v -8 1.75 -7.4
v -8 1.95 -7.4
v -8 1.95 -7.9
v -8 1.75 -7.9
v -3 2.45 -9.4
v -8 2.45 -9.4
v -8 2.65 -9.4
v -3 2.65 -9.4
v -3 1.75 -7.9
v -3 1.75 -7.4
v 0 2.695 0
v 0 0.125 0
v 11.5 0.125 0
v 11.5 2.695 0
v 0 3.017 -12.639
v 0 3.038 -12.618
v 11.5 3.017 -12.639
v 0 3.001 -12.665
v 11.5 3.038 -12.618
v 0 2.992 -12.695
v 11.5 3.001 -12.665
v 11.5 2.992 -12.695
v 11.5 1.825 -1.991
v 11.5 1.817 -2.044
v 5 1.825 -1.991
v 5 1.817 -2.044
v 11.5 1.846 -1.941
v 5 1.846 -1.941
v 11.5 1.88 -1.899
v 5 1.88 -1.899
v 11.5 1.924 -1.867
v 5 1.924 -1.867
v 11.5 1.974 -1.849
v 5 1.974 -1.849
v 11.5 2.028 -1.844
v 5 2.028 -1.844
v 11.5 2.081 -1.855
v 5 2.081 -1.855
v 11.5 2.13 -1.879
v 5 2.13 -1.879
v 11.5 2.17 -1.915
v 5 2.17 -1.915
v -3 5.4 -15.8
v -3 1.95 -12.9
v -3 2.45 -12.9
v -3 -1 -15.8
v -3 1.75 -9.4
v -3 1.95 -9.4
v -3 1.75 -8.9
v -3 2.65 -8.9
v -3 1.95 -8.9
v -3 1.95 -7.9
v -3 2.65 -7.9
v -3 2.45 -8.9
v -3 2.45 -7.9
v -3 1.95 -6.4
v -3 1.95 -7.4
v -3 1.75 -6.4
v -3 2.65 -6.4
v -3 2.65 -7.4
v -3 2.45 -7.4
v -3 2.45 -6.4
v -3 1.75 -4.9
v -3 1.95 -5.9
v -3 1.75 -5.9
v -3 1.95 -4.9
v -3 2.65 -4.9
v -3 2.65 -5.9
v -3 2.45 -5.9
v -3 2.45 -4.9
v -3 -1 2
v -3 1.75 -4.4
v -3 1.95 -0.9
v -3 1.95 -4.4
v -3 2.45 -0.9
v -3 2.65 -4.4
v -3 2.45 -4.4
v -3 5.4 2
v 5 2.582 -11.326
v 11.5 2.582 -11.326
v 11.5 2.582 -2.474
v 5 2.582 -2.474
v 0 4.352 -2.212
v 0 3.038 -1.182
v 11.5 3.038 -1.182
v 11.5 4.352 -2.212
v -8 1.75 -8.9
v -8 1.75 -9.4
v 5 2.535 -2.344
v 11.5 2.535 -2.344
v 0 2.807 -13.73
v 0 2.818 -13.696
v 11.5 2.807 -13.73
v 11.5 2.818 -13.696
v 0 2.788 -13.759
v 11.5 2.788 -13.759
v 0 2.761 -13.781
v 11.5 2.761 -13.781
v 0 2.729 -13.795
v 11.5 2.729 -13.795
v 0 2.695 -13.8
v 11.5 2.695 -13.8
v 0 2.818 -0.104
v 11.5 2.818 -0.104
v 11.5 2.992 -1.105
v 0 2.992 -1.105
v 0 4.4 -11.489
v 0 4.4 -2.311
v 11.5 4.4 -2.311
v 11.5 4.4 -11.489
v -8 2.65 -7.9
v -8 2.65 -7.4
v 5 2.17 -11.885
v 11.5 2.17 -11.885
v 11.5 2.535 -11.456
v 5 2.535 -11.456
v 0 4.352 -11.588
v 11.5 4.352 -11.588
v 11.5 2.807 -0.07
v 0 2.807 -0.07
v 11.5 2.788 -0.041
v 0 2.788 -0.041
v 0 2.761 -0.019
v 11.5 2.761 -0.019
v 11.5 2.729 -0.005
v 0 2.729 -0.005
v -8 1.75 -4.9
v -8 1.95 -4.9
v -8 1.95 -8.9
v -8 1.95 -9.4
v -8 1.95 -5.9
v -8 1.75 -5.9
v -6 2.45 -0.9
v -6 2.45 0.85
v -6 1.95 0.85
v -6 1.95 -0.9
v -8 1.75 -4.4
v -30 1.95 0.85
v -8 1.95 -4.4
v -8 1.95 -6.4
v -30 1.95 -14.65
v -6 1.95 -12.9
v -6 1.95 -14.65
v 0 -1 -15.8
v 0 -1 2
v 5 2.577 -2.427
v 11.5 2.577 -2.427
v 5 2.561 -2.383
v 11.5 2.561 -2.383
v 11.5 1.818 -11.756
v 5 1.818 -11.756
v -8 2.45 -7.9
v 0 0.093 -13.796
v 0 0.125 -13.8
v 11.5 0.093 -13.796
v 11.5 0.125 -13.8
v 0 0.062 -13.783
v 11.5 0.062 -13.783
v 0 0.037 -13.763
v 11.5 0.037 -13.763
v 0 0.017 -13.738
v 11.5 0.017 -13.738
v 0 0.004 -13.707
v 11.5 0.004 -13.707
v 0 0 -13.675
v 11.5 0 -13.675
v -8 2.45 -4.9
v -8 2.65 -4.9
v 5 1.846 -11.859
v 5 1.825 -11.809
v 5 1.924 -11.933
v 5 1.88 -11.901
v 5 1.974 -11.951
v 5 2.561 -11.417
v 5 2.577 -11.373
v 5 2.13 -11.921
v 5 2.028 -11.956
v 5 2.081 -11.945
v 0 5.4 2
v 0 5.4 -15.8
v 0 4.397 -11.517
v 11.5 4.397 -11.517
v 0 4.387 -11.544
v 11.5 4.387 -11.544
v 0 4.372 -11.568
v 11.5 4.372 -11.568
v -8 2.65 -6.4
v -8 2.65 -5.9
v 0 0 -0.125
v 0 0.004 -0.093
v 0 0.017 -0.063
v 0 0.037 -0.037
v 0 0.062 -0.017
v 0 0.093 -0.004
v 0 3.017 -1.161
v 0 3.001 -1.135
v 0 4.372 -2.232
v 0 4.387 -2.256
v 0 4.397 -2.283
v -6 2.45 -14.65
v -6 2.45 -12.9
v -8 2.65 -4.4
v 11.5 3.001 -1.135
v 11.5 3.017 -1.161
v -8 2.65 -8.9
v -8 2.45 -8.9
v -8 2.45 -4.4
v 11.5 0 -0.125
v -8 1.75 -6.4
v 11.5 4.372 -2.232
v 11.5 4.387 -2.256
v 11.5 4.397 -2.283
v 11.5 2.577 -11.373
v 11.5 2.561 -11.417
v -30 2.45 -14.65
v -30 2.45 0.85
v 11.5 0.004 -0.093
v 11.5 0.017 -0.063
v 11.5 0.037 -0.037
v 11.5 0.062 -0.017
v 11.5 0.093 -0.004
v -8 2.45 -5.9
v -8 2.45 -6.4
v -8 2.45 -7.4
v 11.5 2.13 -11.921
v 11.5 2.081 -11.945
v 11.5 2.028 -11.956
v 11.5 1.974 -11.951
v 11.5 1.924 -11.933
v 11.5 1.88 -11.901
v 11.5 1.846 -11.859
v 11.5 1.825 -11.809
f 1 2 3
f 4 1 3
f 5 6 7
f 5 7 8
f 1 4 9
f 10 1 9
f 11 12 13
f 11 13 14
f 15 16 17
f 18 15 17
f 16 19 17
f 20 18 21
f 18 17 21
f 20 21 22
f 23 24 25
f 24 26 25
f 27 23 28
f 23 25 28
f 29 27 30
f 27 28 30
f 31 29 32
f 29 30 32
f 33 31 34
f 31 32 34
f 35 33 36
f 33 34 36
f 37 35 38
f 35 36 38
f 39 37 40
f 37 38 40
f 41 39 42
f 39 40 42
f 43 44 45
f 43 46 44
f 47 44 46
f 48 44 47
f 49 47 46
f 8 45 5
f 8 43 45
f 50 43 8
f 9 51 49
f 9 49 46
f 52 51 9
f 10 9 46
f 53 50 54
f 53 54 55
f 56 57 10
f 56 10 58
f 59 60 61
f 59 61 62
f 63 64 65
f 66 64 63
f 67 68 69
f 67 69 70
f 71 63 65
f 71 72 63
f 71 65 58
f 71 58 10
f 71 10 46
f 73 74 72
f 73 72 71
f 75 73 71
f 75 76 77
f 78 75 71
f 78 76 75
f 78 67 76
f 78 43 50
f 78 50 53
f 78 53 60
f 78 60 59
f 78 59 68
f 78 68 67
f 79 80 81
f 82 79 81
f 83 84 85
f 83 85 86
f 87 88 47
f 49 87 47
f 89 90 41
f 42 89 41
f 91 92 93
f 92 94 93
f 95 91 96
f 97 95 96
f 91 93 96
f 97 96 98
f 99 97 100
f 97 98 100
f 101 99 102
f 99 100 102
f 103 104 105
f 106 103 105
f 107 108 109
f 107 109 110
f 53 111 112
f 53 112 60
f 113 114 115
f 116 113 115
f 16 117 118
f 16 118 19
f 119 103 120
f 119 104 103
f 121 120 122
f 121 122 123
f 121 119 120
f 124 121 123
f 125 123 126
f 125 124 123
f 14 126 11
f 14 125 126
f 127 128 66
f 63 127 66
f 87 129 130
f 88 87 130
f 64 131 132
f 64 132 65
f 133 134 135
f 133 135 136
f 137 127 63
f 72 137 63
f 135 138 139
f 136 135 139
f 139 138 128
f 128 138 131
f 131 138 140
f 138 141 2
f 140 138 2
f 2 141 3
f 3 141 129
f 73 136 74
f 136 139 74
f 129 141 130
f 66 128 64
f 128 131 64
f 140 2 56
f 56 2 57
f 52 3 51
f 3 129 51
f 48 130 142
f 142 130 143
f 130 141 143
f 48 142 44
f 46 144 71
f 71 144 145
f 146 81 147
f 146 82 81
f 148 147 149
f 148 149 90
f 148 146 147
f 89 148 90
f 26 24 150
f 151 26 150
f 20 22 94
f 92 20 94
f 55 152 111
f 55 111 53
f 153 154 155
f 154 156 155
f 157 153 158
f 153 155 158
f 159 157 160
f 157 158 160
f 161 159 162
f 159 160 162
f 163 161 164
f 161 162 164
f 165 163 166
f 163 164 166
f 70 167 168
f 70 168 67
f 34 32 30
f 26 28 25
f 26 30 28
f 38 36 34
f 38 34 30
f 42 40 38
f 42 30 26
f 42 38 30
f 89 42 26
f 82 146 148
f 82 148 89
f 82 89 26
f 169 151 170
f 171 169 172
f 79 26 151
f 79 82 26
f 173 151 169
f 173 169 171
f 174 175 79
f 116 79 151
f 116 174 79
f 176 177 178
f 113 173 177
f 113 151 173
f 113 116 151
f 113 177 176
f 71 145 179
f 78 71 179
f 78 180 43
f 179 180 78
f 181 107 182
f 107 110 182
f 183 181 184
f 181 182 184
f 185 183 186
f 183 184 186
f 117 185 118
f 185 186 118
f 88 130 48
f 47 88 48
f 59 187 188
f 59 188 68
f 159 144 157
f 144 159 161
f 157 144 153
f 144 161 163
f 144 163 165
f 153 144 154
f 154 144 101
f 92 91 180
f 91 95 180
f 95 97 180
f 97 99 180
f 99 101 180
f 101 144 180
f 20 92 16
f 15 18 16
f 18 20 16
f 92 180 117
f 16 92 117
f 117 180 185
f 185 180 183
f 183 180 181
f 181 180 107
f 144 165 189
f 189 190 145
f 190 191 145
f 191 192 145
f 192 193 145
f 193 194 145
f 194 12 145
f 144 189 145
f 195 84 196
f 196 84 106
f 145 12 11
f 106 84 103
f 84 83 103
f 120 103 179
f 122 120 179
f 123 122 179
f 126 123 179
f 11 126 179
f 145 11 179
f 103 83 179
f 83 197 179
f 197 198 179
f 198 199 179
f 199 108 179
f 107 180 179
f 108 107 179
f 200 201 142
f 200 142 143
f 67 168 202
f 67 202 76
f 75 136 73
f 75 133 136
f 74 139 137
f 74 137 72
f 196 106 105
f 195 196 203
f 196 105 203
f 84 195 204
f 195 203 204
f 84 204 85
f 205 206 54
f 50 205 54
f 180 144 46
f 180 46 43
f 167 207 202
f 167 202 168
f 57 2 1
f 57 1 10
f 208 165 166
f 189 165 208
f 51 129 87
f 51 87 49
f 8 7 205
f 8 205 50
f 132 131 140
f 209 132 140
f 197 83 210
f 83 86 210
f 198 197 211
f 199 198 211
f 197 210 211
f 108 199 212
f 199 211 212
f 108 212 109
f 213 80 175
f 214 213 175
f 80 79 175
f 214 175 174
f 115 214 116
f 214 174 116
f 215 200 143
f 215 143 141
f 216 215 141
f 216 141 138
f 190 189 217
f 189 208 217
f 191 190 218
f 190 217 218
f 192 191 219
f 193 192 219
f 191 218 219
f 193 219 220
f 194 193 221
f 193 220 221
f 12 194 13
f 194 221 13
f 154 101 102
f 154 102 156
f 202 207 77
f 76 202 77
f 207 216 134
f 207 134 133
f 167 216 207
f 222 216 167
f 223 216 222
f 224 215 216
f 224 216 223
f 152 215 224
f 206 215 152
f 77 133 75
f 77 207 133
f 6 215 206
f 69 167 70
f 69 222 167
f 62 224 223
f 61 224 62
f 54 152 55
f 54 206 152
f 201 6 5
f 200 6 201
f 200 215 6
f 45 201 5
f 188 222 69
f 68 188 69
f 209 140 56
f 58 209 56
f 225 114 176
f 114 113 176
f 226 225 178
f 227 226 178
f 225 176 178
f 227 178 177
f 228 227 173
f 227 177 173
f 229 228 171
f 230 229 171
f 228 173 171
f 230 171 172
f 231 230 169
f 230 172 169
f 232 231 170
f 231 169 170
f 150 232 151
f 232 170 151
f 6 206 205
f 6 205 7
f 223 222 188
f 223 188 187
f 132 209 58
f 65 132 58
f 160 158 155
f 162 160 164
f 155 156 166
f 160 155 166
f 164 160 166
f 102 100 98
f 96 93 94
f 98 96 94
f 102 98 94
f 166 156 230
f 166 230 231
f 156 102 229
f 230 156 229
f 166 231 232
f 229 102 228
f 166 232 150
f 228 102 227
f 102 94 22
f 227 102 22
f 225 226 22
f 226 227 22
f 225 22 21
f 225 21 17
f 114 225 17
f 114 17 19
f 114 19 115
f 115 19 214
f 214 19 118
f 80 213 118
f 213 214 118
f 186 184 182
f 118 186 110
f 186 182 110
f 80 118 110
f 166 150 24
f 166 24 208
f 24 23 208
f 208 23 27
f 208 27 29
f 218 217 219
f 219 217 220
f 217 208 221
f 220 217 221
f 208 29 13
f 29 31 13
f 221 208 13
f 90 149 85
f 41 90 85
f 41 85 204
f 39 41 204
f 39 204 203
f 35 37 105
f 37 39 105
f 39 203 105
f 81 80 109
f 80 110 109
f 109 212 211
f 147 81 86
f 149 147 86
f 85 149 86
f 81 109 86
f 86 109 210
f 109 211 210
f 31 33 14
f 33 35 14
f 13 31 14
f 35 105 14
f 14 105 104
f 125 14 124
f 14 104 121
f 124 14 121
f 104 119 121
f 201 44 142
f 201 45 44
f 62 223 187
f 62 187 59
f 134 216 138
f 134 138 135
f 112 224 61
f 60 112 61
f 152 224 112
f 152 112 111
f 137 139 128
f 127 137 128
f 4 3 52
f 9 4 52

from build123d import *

# Parameters (mm, degrees)
BOSS_EXTRUDE1_DEPTH = 11.5
SKETCH2_W           = 17.8
SKETCH2_H           = 6.4
BOSS_EXTRUDE2_DEPTH = 3
BOSS_EXTRUDE3_DEPTH = 0.25
SKETCH4_W           = 5
SKETCH4_H           = 0.5
BOSS_EXTRUDE4_DEPTH = 0.2
FILLET1_R           = 0.125
CUT_EXTRUDE1_DEPTH  = 6.5
FILLET2_R           = 0.2


with BuildPart() as part:
    # Sketch1 → Boss-Extrude1 (new body)
    with BuildSketch(Plane(origin=(0, 0, 0), x_dir=(0, 0, -1), z_dir=(1, 0, 0))):
        Polygon((0, 2.8), (1.152683079, 3.000553531), (2.25, 4.4), (11.55, 4.4), (12.647316921, 3.000553531), (13.8, 2.8), (13.8, 0), (0, 0), align=None)
    extrude(amount=BOSS_EXTRUDE1_DEPTH)

    # Sketch2 → Boss-Extrude2 (add)
    with BuildSketch(Plane.ZY):
        with Locations((-6.9, 2.2)):
            Rectangle(SKETCH2_W, SKETCH2_H)
    extrude(amount=BOSS_EXTRUDE2_DEPTH)

    # Sketch3 → Boss-Extrude3 (add, symmetric)
    with BuildSketch(Plane(origin=(0, 2.2, 0), x_dir=(1, 0, 0), z_dir=(0, 1, 0))):
        Polygon((-3, 12.9), (-6, 12.9), (-6, 14.65), (-30, 14.65), (-30, -0.85), (-6, -0.85), (-6, 0.9), (-3, 0.9), align=None)
    extrude(amount=BOSS_EXTRUDE3_DEPTH, both=True)

    # Sketch4 → Boss-Extrude4 (add)
    with BuildSketch(Plane(origin=(0, 2.45, 0), x_dir=(1, 0, 0), z_dir=(0, 1, 0))):
        with Locations((-5.5, 9.15)):
            Rectangle(SKETCH4_W, SKETCH4_H)
        with Locations((-5.5, 7.65)):
            Rectangle(SKETCH4_W, SKETCH4_H)
        with Locations((-5.5, 6.15)):
            Rectangle(SKETCH4_W, SKETCH4_H)
        with Locations((-5.5, 4.65)):
            Rectangle(SKETCH4_W, SKETCH4_H)
    boss_extrude4 = extrude(amount=BOSS_EXTRUDE4_DEPTH)

    # Mirror1: Boss-Extrude4 across plane
    add(boss_extrude4.mirror(Plane.ZX.offset(2.2)))

    # Fillet1
    fillet1_edges = [part.edges().sort_by_distance(p)[0] for p in [
        (5.75, 2.8, 0),
        (5.75, 3.000553531, -1.152683079),
        (5.75, 4.4, -2.25),
        (5.75, 4.4, -11.55),
        (5.75, 3.000553531, -12.647316921),
        (5.75, 2.8, -13.8),
        (5.75, 0, -13.8),
        (5.75, 0, 0),
    ]]
    fillet(fillet1_edges, radius=FILLET1_R)

    # Sketch5 → Cut-Extrude1 (cut)
    with BuildSketch(Plane(origin=(11.5, 0, 0), x_dir=(0, 0, -1), z_dir=(1, 0, 0))):
        Polygon((2.4, 2.5825), (1.5, 1.8175), (12.3, 1.8175), (11.4, 2.5825), align=None)
    extrude(amount=-CUT_EXTRUDE1_DEPTH, mode=Mode.SUBTRACT)

    # Fillet2
    fillet2_edges = [part.edges().sort_by_distance(p)[0] for p in [
        (8.25, 1.8175, -1.5),
        (8.25, 1.8175, -12.3),
        (8.25, 2.5825, -11.4),
        (8.25, 2.5825, -2.4),
    ]]
    fillet(fillet2_edges, radius=FILLET2_R)


solid = part.part
